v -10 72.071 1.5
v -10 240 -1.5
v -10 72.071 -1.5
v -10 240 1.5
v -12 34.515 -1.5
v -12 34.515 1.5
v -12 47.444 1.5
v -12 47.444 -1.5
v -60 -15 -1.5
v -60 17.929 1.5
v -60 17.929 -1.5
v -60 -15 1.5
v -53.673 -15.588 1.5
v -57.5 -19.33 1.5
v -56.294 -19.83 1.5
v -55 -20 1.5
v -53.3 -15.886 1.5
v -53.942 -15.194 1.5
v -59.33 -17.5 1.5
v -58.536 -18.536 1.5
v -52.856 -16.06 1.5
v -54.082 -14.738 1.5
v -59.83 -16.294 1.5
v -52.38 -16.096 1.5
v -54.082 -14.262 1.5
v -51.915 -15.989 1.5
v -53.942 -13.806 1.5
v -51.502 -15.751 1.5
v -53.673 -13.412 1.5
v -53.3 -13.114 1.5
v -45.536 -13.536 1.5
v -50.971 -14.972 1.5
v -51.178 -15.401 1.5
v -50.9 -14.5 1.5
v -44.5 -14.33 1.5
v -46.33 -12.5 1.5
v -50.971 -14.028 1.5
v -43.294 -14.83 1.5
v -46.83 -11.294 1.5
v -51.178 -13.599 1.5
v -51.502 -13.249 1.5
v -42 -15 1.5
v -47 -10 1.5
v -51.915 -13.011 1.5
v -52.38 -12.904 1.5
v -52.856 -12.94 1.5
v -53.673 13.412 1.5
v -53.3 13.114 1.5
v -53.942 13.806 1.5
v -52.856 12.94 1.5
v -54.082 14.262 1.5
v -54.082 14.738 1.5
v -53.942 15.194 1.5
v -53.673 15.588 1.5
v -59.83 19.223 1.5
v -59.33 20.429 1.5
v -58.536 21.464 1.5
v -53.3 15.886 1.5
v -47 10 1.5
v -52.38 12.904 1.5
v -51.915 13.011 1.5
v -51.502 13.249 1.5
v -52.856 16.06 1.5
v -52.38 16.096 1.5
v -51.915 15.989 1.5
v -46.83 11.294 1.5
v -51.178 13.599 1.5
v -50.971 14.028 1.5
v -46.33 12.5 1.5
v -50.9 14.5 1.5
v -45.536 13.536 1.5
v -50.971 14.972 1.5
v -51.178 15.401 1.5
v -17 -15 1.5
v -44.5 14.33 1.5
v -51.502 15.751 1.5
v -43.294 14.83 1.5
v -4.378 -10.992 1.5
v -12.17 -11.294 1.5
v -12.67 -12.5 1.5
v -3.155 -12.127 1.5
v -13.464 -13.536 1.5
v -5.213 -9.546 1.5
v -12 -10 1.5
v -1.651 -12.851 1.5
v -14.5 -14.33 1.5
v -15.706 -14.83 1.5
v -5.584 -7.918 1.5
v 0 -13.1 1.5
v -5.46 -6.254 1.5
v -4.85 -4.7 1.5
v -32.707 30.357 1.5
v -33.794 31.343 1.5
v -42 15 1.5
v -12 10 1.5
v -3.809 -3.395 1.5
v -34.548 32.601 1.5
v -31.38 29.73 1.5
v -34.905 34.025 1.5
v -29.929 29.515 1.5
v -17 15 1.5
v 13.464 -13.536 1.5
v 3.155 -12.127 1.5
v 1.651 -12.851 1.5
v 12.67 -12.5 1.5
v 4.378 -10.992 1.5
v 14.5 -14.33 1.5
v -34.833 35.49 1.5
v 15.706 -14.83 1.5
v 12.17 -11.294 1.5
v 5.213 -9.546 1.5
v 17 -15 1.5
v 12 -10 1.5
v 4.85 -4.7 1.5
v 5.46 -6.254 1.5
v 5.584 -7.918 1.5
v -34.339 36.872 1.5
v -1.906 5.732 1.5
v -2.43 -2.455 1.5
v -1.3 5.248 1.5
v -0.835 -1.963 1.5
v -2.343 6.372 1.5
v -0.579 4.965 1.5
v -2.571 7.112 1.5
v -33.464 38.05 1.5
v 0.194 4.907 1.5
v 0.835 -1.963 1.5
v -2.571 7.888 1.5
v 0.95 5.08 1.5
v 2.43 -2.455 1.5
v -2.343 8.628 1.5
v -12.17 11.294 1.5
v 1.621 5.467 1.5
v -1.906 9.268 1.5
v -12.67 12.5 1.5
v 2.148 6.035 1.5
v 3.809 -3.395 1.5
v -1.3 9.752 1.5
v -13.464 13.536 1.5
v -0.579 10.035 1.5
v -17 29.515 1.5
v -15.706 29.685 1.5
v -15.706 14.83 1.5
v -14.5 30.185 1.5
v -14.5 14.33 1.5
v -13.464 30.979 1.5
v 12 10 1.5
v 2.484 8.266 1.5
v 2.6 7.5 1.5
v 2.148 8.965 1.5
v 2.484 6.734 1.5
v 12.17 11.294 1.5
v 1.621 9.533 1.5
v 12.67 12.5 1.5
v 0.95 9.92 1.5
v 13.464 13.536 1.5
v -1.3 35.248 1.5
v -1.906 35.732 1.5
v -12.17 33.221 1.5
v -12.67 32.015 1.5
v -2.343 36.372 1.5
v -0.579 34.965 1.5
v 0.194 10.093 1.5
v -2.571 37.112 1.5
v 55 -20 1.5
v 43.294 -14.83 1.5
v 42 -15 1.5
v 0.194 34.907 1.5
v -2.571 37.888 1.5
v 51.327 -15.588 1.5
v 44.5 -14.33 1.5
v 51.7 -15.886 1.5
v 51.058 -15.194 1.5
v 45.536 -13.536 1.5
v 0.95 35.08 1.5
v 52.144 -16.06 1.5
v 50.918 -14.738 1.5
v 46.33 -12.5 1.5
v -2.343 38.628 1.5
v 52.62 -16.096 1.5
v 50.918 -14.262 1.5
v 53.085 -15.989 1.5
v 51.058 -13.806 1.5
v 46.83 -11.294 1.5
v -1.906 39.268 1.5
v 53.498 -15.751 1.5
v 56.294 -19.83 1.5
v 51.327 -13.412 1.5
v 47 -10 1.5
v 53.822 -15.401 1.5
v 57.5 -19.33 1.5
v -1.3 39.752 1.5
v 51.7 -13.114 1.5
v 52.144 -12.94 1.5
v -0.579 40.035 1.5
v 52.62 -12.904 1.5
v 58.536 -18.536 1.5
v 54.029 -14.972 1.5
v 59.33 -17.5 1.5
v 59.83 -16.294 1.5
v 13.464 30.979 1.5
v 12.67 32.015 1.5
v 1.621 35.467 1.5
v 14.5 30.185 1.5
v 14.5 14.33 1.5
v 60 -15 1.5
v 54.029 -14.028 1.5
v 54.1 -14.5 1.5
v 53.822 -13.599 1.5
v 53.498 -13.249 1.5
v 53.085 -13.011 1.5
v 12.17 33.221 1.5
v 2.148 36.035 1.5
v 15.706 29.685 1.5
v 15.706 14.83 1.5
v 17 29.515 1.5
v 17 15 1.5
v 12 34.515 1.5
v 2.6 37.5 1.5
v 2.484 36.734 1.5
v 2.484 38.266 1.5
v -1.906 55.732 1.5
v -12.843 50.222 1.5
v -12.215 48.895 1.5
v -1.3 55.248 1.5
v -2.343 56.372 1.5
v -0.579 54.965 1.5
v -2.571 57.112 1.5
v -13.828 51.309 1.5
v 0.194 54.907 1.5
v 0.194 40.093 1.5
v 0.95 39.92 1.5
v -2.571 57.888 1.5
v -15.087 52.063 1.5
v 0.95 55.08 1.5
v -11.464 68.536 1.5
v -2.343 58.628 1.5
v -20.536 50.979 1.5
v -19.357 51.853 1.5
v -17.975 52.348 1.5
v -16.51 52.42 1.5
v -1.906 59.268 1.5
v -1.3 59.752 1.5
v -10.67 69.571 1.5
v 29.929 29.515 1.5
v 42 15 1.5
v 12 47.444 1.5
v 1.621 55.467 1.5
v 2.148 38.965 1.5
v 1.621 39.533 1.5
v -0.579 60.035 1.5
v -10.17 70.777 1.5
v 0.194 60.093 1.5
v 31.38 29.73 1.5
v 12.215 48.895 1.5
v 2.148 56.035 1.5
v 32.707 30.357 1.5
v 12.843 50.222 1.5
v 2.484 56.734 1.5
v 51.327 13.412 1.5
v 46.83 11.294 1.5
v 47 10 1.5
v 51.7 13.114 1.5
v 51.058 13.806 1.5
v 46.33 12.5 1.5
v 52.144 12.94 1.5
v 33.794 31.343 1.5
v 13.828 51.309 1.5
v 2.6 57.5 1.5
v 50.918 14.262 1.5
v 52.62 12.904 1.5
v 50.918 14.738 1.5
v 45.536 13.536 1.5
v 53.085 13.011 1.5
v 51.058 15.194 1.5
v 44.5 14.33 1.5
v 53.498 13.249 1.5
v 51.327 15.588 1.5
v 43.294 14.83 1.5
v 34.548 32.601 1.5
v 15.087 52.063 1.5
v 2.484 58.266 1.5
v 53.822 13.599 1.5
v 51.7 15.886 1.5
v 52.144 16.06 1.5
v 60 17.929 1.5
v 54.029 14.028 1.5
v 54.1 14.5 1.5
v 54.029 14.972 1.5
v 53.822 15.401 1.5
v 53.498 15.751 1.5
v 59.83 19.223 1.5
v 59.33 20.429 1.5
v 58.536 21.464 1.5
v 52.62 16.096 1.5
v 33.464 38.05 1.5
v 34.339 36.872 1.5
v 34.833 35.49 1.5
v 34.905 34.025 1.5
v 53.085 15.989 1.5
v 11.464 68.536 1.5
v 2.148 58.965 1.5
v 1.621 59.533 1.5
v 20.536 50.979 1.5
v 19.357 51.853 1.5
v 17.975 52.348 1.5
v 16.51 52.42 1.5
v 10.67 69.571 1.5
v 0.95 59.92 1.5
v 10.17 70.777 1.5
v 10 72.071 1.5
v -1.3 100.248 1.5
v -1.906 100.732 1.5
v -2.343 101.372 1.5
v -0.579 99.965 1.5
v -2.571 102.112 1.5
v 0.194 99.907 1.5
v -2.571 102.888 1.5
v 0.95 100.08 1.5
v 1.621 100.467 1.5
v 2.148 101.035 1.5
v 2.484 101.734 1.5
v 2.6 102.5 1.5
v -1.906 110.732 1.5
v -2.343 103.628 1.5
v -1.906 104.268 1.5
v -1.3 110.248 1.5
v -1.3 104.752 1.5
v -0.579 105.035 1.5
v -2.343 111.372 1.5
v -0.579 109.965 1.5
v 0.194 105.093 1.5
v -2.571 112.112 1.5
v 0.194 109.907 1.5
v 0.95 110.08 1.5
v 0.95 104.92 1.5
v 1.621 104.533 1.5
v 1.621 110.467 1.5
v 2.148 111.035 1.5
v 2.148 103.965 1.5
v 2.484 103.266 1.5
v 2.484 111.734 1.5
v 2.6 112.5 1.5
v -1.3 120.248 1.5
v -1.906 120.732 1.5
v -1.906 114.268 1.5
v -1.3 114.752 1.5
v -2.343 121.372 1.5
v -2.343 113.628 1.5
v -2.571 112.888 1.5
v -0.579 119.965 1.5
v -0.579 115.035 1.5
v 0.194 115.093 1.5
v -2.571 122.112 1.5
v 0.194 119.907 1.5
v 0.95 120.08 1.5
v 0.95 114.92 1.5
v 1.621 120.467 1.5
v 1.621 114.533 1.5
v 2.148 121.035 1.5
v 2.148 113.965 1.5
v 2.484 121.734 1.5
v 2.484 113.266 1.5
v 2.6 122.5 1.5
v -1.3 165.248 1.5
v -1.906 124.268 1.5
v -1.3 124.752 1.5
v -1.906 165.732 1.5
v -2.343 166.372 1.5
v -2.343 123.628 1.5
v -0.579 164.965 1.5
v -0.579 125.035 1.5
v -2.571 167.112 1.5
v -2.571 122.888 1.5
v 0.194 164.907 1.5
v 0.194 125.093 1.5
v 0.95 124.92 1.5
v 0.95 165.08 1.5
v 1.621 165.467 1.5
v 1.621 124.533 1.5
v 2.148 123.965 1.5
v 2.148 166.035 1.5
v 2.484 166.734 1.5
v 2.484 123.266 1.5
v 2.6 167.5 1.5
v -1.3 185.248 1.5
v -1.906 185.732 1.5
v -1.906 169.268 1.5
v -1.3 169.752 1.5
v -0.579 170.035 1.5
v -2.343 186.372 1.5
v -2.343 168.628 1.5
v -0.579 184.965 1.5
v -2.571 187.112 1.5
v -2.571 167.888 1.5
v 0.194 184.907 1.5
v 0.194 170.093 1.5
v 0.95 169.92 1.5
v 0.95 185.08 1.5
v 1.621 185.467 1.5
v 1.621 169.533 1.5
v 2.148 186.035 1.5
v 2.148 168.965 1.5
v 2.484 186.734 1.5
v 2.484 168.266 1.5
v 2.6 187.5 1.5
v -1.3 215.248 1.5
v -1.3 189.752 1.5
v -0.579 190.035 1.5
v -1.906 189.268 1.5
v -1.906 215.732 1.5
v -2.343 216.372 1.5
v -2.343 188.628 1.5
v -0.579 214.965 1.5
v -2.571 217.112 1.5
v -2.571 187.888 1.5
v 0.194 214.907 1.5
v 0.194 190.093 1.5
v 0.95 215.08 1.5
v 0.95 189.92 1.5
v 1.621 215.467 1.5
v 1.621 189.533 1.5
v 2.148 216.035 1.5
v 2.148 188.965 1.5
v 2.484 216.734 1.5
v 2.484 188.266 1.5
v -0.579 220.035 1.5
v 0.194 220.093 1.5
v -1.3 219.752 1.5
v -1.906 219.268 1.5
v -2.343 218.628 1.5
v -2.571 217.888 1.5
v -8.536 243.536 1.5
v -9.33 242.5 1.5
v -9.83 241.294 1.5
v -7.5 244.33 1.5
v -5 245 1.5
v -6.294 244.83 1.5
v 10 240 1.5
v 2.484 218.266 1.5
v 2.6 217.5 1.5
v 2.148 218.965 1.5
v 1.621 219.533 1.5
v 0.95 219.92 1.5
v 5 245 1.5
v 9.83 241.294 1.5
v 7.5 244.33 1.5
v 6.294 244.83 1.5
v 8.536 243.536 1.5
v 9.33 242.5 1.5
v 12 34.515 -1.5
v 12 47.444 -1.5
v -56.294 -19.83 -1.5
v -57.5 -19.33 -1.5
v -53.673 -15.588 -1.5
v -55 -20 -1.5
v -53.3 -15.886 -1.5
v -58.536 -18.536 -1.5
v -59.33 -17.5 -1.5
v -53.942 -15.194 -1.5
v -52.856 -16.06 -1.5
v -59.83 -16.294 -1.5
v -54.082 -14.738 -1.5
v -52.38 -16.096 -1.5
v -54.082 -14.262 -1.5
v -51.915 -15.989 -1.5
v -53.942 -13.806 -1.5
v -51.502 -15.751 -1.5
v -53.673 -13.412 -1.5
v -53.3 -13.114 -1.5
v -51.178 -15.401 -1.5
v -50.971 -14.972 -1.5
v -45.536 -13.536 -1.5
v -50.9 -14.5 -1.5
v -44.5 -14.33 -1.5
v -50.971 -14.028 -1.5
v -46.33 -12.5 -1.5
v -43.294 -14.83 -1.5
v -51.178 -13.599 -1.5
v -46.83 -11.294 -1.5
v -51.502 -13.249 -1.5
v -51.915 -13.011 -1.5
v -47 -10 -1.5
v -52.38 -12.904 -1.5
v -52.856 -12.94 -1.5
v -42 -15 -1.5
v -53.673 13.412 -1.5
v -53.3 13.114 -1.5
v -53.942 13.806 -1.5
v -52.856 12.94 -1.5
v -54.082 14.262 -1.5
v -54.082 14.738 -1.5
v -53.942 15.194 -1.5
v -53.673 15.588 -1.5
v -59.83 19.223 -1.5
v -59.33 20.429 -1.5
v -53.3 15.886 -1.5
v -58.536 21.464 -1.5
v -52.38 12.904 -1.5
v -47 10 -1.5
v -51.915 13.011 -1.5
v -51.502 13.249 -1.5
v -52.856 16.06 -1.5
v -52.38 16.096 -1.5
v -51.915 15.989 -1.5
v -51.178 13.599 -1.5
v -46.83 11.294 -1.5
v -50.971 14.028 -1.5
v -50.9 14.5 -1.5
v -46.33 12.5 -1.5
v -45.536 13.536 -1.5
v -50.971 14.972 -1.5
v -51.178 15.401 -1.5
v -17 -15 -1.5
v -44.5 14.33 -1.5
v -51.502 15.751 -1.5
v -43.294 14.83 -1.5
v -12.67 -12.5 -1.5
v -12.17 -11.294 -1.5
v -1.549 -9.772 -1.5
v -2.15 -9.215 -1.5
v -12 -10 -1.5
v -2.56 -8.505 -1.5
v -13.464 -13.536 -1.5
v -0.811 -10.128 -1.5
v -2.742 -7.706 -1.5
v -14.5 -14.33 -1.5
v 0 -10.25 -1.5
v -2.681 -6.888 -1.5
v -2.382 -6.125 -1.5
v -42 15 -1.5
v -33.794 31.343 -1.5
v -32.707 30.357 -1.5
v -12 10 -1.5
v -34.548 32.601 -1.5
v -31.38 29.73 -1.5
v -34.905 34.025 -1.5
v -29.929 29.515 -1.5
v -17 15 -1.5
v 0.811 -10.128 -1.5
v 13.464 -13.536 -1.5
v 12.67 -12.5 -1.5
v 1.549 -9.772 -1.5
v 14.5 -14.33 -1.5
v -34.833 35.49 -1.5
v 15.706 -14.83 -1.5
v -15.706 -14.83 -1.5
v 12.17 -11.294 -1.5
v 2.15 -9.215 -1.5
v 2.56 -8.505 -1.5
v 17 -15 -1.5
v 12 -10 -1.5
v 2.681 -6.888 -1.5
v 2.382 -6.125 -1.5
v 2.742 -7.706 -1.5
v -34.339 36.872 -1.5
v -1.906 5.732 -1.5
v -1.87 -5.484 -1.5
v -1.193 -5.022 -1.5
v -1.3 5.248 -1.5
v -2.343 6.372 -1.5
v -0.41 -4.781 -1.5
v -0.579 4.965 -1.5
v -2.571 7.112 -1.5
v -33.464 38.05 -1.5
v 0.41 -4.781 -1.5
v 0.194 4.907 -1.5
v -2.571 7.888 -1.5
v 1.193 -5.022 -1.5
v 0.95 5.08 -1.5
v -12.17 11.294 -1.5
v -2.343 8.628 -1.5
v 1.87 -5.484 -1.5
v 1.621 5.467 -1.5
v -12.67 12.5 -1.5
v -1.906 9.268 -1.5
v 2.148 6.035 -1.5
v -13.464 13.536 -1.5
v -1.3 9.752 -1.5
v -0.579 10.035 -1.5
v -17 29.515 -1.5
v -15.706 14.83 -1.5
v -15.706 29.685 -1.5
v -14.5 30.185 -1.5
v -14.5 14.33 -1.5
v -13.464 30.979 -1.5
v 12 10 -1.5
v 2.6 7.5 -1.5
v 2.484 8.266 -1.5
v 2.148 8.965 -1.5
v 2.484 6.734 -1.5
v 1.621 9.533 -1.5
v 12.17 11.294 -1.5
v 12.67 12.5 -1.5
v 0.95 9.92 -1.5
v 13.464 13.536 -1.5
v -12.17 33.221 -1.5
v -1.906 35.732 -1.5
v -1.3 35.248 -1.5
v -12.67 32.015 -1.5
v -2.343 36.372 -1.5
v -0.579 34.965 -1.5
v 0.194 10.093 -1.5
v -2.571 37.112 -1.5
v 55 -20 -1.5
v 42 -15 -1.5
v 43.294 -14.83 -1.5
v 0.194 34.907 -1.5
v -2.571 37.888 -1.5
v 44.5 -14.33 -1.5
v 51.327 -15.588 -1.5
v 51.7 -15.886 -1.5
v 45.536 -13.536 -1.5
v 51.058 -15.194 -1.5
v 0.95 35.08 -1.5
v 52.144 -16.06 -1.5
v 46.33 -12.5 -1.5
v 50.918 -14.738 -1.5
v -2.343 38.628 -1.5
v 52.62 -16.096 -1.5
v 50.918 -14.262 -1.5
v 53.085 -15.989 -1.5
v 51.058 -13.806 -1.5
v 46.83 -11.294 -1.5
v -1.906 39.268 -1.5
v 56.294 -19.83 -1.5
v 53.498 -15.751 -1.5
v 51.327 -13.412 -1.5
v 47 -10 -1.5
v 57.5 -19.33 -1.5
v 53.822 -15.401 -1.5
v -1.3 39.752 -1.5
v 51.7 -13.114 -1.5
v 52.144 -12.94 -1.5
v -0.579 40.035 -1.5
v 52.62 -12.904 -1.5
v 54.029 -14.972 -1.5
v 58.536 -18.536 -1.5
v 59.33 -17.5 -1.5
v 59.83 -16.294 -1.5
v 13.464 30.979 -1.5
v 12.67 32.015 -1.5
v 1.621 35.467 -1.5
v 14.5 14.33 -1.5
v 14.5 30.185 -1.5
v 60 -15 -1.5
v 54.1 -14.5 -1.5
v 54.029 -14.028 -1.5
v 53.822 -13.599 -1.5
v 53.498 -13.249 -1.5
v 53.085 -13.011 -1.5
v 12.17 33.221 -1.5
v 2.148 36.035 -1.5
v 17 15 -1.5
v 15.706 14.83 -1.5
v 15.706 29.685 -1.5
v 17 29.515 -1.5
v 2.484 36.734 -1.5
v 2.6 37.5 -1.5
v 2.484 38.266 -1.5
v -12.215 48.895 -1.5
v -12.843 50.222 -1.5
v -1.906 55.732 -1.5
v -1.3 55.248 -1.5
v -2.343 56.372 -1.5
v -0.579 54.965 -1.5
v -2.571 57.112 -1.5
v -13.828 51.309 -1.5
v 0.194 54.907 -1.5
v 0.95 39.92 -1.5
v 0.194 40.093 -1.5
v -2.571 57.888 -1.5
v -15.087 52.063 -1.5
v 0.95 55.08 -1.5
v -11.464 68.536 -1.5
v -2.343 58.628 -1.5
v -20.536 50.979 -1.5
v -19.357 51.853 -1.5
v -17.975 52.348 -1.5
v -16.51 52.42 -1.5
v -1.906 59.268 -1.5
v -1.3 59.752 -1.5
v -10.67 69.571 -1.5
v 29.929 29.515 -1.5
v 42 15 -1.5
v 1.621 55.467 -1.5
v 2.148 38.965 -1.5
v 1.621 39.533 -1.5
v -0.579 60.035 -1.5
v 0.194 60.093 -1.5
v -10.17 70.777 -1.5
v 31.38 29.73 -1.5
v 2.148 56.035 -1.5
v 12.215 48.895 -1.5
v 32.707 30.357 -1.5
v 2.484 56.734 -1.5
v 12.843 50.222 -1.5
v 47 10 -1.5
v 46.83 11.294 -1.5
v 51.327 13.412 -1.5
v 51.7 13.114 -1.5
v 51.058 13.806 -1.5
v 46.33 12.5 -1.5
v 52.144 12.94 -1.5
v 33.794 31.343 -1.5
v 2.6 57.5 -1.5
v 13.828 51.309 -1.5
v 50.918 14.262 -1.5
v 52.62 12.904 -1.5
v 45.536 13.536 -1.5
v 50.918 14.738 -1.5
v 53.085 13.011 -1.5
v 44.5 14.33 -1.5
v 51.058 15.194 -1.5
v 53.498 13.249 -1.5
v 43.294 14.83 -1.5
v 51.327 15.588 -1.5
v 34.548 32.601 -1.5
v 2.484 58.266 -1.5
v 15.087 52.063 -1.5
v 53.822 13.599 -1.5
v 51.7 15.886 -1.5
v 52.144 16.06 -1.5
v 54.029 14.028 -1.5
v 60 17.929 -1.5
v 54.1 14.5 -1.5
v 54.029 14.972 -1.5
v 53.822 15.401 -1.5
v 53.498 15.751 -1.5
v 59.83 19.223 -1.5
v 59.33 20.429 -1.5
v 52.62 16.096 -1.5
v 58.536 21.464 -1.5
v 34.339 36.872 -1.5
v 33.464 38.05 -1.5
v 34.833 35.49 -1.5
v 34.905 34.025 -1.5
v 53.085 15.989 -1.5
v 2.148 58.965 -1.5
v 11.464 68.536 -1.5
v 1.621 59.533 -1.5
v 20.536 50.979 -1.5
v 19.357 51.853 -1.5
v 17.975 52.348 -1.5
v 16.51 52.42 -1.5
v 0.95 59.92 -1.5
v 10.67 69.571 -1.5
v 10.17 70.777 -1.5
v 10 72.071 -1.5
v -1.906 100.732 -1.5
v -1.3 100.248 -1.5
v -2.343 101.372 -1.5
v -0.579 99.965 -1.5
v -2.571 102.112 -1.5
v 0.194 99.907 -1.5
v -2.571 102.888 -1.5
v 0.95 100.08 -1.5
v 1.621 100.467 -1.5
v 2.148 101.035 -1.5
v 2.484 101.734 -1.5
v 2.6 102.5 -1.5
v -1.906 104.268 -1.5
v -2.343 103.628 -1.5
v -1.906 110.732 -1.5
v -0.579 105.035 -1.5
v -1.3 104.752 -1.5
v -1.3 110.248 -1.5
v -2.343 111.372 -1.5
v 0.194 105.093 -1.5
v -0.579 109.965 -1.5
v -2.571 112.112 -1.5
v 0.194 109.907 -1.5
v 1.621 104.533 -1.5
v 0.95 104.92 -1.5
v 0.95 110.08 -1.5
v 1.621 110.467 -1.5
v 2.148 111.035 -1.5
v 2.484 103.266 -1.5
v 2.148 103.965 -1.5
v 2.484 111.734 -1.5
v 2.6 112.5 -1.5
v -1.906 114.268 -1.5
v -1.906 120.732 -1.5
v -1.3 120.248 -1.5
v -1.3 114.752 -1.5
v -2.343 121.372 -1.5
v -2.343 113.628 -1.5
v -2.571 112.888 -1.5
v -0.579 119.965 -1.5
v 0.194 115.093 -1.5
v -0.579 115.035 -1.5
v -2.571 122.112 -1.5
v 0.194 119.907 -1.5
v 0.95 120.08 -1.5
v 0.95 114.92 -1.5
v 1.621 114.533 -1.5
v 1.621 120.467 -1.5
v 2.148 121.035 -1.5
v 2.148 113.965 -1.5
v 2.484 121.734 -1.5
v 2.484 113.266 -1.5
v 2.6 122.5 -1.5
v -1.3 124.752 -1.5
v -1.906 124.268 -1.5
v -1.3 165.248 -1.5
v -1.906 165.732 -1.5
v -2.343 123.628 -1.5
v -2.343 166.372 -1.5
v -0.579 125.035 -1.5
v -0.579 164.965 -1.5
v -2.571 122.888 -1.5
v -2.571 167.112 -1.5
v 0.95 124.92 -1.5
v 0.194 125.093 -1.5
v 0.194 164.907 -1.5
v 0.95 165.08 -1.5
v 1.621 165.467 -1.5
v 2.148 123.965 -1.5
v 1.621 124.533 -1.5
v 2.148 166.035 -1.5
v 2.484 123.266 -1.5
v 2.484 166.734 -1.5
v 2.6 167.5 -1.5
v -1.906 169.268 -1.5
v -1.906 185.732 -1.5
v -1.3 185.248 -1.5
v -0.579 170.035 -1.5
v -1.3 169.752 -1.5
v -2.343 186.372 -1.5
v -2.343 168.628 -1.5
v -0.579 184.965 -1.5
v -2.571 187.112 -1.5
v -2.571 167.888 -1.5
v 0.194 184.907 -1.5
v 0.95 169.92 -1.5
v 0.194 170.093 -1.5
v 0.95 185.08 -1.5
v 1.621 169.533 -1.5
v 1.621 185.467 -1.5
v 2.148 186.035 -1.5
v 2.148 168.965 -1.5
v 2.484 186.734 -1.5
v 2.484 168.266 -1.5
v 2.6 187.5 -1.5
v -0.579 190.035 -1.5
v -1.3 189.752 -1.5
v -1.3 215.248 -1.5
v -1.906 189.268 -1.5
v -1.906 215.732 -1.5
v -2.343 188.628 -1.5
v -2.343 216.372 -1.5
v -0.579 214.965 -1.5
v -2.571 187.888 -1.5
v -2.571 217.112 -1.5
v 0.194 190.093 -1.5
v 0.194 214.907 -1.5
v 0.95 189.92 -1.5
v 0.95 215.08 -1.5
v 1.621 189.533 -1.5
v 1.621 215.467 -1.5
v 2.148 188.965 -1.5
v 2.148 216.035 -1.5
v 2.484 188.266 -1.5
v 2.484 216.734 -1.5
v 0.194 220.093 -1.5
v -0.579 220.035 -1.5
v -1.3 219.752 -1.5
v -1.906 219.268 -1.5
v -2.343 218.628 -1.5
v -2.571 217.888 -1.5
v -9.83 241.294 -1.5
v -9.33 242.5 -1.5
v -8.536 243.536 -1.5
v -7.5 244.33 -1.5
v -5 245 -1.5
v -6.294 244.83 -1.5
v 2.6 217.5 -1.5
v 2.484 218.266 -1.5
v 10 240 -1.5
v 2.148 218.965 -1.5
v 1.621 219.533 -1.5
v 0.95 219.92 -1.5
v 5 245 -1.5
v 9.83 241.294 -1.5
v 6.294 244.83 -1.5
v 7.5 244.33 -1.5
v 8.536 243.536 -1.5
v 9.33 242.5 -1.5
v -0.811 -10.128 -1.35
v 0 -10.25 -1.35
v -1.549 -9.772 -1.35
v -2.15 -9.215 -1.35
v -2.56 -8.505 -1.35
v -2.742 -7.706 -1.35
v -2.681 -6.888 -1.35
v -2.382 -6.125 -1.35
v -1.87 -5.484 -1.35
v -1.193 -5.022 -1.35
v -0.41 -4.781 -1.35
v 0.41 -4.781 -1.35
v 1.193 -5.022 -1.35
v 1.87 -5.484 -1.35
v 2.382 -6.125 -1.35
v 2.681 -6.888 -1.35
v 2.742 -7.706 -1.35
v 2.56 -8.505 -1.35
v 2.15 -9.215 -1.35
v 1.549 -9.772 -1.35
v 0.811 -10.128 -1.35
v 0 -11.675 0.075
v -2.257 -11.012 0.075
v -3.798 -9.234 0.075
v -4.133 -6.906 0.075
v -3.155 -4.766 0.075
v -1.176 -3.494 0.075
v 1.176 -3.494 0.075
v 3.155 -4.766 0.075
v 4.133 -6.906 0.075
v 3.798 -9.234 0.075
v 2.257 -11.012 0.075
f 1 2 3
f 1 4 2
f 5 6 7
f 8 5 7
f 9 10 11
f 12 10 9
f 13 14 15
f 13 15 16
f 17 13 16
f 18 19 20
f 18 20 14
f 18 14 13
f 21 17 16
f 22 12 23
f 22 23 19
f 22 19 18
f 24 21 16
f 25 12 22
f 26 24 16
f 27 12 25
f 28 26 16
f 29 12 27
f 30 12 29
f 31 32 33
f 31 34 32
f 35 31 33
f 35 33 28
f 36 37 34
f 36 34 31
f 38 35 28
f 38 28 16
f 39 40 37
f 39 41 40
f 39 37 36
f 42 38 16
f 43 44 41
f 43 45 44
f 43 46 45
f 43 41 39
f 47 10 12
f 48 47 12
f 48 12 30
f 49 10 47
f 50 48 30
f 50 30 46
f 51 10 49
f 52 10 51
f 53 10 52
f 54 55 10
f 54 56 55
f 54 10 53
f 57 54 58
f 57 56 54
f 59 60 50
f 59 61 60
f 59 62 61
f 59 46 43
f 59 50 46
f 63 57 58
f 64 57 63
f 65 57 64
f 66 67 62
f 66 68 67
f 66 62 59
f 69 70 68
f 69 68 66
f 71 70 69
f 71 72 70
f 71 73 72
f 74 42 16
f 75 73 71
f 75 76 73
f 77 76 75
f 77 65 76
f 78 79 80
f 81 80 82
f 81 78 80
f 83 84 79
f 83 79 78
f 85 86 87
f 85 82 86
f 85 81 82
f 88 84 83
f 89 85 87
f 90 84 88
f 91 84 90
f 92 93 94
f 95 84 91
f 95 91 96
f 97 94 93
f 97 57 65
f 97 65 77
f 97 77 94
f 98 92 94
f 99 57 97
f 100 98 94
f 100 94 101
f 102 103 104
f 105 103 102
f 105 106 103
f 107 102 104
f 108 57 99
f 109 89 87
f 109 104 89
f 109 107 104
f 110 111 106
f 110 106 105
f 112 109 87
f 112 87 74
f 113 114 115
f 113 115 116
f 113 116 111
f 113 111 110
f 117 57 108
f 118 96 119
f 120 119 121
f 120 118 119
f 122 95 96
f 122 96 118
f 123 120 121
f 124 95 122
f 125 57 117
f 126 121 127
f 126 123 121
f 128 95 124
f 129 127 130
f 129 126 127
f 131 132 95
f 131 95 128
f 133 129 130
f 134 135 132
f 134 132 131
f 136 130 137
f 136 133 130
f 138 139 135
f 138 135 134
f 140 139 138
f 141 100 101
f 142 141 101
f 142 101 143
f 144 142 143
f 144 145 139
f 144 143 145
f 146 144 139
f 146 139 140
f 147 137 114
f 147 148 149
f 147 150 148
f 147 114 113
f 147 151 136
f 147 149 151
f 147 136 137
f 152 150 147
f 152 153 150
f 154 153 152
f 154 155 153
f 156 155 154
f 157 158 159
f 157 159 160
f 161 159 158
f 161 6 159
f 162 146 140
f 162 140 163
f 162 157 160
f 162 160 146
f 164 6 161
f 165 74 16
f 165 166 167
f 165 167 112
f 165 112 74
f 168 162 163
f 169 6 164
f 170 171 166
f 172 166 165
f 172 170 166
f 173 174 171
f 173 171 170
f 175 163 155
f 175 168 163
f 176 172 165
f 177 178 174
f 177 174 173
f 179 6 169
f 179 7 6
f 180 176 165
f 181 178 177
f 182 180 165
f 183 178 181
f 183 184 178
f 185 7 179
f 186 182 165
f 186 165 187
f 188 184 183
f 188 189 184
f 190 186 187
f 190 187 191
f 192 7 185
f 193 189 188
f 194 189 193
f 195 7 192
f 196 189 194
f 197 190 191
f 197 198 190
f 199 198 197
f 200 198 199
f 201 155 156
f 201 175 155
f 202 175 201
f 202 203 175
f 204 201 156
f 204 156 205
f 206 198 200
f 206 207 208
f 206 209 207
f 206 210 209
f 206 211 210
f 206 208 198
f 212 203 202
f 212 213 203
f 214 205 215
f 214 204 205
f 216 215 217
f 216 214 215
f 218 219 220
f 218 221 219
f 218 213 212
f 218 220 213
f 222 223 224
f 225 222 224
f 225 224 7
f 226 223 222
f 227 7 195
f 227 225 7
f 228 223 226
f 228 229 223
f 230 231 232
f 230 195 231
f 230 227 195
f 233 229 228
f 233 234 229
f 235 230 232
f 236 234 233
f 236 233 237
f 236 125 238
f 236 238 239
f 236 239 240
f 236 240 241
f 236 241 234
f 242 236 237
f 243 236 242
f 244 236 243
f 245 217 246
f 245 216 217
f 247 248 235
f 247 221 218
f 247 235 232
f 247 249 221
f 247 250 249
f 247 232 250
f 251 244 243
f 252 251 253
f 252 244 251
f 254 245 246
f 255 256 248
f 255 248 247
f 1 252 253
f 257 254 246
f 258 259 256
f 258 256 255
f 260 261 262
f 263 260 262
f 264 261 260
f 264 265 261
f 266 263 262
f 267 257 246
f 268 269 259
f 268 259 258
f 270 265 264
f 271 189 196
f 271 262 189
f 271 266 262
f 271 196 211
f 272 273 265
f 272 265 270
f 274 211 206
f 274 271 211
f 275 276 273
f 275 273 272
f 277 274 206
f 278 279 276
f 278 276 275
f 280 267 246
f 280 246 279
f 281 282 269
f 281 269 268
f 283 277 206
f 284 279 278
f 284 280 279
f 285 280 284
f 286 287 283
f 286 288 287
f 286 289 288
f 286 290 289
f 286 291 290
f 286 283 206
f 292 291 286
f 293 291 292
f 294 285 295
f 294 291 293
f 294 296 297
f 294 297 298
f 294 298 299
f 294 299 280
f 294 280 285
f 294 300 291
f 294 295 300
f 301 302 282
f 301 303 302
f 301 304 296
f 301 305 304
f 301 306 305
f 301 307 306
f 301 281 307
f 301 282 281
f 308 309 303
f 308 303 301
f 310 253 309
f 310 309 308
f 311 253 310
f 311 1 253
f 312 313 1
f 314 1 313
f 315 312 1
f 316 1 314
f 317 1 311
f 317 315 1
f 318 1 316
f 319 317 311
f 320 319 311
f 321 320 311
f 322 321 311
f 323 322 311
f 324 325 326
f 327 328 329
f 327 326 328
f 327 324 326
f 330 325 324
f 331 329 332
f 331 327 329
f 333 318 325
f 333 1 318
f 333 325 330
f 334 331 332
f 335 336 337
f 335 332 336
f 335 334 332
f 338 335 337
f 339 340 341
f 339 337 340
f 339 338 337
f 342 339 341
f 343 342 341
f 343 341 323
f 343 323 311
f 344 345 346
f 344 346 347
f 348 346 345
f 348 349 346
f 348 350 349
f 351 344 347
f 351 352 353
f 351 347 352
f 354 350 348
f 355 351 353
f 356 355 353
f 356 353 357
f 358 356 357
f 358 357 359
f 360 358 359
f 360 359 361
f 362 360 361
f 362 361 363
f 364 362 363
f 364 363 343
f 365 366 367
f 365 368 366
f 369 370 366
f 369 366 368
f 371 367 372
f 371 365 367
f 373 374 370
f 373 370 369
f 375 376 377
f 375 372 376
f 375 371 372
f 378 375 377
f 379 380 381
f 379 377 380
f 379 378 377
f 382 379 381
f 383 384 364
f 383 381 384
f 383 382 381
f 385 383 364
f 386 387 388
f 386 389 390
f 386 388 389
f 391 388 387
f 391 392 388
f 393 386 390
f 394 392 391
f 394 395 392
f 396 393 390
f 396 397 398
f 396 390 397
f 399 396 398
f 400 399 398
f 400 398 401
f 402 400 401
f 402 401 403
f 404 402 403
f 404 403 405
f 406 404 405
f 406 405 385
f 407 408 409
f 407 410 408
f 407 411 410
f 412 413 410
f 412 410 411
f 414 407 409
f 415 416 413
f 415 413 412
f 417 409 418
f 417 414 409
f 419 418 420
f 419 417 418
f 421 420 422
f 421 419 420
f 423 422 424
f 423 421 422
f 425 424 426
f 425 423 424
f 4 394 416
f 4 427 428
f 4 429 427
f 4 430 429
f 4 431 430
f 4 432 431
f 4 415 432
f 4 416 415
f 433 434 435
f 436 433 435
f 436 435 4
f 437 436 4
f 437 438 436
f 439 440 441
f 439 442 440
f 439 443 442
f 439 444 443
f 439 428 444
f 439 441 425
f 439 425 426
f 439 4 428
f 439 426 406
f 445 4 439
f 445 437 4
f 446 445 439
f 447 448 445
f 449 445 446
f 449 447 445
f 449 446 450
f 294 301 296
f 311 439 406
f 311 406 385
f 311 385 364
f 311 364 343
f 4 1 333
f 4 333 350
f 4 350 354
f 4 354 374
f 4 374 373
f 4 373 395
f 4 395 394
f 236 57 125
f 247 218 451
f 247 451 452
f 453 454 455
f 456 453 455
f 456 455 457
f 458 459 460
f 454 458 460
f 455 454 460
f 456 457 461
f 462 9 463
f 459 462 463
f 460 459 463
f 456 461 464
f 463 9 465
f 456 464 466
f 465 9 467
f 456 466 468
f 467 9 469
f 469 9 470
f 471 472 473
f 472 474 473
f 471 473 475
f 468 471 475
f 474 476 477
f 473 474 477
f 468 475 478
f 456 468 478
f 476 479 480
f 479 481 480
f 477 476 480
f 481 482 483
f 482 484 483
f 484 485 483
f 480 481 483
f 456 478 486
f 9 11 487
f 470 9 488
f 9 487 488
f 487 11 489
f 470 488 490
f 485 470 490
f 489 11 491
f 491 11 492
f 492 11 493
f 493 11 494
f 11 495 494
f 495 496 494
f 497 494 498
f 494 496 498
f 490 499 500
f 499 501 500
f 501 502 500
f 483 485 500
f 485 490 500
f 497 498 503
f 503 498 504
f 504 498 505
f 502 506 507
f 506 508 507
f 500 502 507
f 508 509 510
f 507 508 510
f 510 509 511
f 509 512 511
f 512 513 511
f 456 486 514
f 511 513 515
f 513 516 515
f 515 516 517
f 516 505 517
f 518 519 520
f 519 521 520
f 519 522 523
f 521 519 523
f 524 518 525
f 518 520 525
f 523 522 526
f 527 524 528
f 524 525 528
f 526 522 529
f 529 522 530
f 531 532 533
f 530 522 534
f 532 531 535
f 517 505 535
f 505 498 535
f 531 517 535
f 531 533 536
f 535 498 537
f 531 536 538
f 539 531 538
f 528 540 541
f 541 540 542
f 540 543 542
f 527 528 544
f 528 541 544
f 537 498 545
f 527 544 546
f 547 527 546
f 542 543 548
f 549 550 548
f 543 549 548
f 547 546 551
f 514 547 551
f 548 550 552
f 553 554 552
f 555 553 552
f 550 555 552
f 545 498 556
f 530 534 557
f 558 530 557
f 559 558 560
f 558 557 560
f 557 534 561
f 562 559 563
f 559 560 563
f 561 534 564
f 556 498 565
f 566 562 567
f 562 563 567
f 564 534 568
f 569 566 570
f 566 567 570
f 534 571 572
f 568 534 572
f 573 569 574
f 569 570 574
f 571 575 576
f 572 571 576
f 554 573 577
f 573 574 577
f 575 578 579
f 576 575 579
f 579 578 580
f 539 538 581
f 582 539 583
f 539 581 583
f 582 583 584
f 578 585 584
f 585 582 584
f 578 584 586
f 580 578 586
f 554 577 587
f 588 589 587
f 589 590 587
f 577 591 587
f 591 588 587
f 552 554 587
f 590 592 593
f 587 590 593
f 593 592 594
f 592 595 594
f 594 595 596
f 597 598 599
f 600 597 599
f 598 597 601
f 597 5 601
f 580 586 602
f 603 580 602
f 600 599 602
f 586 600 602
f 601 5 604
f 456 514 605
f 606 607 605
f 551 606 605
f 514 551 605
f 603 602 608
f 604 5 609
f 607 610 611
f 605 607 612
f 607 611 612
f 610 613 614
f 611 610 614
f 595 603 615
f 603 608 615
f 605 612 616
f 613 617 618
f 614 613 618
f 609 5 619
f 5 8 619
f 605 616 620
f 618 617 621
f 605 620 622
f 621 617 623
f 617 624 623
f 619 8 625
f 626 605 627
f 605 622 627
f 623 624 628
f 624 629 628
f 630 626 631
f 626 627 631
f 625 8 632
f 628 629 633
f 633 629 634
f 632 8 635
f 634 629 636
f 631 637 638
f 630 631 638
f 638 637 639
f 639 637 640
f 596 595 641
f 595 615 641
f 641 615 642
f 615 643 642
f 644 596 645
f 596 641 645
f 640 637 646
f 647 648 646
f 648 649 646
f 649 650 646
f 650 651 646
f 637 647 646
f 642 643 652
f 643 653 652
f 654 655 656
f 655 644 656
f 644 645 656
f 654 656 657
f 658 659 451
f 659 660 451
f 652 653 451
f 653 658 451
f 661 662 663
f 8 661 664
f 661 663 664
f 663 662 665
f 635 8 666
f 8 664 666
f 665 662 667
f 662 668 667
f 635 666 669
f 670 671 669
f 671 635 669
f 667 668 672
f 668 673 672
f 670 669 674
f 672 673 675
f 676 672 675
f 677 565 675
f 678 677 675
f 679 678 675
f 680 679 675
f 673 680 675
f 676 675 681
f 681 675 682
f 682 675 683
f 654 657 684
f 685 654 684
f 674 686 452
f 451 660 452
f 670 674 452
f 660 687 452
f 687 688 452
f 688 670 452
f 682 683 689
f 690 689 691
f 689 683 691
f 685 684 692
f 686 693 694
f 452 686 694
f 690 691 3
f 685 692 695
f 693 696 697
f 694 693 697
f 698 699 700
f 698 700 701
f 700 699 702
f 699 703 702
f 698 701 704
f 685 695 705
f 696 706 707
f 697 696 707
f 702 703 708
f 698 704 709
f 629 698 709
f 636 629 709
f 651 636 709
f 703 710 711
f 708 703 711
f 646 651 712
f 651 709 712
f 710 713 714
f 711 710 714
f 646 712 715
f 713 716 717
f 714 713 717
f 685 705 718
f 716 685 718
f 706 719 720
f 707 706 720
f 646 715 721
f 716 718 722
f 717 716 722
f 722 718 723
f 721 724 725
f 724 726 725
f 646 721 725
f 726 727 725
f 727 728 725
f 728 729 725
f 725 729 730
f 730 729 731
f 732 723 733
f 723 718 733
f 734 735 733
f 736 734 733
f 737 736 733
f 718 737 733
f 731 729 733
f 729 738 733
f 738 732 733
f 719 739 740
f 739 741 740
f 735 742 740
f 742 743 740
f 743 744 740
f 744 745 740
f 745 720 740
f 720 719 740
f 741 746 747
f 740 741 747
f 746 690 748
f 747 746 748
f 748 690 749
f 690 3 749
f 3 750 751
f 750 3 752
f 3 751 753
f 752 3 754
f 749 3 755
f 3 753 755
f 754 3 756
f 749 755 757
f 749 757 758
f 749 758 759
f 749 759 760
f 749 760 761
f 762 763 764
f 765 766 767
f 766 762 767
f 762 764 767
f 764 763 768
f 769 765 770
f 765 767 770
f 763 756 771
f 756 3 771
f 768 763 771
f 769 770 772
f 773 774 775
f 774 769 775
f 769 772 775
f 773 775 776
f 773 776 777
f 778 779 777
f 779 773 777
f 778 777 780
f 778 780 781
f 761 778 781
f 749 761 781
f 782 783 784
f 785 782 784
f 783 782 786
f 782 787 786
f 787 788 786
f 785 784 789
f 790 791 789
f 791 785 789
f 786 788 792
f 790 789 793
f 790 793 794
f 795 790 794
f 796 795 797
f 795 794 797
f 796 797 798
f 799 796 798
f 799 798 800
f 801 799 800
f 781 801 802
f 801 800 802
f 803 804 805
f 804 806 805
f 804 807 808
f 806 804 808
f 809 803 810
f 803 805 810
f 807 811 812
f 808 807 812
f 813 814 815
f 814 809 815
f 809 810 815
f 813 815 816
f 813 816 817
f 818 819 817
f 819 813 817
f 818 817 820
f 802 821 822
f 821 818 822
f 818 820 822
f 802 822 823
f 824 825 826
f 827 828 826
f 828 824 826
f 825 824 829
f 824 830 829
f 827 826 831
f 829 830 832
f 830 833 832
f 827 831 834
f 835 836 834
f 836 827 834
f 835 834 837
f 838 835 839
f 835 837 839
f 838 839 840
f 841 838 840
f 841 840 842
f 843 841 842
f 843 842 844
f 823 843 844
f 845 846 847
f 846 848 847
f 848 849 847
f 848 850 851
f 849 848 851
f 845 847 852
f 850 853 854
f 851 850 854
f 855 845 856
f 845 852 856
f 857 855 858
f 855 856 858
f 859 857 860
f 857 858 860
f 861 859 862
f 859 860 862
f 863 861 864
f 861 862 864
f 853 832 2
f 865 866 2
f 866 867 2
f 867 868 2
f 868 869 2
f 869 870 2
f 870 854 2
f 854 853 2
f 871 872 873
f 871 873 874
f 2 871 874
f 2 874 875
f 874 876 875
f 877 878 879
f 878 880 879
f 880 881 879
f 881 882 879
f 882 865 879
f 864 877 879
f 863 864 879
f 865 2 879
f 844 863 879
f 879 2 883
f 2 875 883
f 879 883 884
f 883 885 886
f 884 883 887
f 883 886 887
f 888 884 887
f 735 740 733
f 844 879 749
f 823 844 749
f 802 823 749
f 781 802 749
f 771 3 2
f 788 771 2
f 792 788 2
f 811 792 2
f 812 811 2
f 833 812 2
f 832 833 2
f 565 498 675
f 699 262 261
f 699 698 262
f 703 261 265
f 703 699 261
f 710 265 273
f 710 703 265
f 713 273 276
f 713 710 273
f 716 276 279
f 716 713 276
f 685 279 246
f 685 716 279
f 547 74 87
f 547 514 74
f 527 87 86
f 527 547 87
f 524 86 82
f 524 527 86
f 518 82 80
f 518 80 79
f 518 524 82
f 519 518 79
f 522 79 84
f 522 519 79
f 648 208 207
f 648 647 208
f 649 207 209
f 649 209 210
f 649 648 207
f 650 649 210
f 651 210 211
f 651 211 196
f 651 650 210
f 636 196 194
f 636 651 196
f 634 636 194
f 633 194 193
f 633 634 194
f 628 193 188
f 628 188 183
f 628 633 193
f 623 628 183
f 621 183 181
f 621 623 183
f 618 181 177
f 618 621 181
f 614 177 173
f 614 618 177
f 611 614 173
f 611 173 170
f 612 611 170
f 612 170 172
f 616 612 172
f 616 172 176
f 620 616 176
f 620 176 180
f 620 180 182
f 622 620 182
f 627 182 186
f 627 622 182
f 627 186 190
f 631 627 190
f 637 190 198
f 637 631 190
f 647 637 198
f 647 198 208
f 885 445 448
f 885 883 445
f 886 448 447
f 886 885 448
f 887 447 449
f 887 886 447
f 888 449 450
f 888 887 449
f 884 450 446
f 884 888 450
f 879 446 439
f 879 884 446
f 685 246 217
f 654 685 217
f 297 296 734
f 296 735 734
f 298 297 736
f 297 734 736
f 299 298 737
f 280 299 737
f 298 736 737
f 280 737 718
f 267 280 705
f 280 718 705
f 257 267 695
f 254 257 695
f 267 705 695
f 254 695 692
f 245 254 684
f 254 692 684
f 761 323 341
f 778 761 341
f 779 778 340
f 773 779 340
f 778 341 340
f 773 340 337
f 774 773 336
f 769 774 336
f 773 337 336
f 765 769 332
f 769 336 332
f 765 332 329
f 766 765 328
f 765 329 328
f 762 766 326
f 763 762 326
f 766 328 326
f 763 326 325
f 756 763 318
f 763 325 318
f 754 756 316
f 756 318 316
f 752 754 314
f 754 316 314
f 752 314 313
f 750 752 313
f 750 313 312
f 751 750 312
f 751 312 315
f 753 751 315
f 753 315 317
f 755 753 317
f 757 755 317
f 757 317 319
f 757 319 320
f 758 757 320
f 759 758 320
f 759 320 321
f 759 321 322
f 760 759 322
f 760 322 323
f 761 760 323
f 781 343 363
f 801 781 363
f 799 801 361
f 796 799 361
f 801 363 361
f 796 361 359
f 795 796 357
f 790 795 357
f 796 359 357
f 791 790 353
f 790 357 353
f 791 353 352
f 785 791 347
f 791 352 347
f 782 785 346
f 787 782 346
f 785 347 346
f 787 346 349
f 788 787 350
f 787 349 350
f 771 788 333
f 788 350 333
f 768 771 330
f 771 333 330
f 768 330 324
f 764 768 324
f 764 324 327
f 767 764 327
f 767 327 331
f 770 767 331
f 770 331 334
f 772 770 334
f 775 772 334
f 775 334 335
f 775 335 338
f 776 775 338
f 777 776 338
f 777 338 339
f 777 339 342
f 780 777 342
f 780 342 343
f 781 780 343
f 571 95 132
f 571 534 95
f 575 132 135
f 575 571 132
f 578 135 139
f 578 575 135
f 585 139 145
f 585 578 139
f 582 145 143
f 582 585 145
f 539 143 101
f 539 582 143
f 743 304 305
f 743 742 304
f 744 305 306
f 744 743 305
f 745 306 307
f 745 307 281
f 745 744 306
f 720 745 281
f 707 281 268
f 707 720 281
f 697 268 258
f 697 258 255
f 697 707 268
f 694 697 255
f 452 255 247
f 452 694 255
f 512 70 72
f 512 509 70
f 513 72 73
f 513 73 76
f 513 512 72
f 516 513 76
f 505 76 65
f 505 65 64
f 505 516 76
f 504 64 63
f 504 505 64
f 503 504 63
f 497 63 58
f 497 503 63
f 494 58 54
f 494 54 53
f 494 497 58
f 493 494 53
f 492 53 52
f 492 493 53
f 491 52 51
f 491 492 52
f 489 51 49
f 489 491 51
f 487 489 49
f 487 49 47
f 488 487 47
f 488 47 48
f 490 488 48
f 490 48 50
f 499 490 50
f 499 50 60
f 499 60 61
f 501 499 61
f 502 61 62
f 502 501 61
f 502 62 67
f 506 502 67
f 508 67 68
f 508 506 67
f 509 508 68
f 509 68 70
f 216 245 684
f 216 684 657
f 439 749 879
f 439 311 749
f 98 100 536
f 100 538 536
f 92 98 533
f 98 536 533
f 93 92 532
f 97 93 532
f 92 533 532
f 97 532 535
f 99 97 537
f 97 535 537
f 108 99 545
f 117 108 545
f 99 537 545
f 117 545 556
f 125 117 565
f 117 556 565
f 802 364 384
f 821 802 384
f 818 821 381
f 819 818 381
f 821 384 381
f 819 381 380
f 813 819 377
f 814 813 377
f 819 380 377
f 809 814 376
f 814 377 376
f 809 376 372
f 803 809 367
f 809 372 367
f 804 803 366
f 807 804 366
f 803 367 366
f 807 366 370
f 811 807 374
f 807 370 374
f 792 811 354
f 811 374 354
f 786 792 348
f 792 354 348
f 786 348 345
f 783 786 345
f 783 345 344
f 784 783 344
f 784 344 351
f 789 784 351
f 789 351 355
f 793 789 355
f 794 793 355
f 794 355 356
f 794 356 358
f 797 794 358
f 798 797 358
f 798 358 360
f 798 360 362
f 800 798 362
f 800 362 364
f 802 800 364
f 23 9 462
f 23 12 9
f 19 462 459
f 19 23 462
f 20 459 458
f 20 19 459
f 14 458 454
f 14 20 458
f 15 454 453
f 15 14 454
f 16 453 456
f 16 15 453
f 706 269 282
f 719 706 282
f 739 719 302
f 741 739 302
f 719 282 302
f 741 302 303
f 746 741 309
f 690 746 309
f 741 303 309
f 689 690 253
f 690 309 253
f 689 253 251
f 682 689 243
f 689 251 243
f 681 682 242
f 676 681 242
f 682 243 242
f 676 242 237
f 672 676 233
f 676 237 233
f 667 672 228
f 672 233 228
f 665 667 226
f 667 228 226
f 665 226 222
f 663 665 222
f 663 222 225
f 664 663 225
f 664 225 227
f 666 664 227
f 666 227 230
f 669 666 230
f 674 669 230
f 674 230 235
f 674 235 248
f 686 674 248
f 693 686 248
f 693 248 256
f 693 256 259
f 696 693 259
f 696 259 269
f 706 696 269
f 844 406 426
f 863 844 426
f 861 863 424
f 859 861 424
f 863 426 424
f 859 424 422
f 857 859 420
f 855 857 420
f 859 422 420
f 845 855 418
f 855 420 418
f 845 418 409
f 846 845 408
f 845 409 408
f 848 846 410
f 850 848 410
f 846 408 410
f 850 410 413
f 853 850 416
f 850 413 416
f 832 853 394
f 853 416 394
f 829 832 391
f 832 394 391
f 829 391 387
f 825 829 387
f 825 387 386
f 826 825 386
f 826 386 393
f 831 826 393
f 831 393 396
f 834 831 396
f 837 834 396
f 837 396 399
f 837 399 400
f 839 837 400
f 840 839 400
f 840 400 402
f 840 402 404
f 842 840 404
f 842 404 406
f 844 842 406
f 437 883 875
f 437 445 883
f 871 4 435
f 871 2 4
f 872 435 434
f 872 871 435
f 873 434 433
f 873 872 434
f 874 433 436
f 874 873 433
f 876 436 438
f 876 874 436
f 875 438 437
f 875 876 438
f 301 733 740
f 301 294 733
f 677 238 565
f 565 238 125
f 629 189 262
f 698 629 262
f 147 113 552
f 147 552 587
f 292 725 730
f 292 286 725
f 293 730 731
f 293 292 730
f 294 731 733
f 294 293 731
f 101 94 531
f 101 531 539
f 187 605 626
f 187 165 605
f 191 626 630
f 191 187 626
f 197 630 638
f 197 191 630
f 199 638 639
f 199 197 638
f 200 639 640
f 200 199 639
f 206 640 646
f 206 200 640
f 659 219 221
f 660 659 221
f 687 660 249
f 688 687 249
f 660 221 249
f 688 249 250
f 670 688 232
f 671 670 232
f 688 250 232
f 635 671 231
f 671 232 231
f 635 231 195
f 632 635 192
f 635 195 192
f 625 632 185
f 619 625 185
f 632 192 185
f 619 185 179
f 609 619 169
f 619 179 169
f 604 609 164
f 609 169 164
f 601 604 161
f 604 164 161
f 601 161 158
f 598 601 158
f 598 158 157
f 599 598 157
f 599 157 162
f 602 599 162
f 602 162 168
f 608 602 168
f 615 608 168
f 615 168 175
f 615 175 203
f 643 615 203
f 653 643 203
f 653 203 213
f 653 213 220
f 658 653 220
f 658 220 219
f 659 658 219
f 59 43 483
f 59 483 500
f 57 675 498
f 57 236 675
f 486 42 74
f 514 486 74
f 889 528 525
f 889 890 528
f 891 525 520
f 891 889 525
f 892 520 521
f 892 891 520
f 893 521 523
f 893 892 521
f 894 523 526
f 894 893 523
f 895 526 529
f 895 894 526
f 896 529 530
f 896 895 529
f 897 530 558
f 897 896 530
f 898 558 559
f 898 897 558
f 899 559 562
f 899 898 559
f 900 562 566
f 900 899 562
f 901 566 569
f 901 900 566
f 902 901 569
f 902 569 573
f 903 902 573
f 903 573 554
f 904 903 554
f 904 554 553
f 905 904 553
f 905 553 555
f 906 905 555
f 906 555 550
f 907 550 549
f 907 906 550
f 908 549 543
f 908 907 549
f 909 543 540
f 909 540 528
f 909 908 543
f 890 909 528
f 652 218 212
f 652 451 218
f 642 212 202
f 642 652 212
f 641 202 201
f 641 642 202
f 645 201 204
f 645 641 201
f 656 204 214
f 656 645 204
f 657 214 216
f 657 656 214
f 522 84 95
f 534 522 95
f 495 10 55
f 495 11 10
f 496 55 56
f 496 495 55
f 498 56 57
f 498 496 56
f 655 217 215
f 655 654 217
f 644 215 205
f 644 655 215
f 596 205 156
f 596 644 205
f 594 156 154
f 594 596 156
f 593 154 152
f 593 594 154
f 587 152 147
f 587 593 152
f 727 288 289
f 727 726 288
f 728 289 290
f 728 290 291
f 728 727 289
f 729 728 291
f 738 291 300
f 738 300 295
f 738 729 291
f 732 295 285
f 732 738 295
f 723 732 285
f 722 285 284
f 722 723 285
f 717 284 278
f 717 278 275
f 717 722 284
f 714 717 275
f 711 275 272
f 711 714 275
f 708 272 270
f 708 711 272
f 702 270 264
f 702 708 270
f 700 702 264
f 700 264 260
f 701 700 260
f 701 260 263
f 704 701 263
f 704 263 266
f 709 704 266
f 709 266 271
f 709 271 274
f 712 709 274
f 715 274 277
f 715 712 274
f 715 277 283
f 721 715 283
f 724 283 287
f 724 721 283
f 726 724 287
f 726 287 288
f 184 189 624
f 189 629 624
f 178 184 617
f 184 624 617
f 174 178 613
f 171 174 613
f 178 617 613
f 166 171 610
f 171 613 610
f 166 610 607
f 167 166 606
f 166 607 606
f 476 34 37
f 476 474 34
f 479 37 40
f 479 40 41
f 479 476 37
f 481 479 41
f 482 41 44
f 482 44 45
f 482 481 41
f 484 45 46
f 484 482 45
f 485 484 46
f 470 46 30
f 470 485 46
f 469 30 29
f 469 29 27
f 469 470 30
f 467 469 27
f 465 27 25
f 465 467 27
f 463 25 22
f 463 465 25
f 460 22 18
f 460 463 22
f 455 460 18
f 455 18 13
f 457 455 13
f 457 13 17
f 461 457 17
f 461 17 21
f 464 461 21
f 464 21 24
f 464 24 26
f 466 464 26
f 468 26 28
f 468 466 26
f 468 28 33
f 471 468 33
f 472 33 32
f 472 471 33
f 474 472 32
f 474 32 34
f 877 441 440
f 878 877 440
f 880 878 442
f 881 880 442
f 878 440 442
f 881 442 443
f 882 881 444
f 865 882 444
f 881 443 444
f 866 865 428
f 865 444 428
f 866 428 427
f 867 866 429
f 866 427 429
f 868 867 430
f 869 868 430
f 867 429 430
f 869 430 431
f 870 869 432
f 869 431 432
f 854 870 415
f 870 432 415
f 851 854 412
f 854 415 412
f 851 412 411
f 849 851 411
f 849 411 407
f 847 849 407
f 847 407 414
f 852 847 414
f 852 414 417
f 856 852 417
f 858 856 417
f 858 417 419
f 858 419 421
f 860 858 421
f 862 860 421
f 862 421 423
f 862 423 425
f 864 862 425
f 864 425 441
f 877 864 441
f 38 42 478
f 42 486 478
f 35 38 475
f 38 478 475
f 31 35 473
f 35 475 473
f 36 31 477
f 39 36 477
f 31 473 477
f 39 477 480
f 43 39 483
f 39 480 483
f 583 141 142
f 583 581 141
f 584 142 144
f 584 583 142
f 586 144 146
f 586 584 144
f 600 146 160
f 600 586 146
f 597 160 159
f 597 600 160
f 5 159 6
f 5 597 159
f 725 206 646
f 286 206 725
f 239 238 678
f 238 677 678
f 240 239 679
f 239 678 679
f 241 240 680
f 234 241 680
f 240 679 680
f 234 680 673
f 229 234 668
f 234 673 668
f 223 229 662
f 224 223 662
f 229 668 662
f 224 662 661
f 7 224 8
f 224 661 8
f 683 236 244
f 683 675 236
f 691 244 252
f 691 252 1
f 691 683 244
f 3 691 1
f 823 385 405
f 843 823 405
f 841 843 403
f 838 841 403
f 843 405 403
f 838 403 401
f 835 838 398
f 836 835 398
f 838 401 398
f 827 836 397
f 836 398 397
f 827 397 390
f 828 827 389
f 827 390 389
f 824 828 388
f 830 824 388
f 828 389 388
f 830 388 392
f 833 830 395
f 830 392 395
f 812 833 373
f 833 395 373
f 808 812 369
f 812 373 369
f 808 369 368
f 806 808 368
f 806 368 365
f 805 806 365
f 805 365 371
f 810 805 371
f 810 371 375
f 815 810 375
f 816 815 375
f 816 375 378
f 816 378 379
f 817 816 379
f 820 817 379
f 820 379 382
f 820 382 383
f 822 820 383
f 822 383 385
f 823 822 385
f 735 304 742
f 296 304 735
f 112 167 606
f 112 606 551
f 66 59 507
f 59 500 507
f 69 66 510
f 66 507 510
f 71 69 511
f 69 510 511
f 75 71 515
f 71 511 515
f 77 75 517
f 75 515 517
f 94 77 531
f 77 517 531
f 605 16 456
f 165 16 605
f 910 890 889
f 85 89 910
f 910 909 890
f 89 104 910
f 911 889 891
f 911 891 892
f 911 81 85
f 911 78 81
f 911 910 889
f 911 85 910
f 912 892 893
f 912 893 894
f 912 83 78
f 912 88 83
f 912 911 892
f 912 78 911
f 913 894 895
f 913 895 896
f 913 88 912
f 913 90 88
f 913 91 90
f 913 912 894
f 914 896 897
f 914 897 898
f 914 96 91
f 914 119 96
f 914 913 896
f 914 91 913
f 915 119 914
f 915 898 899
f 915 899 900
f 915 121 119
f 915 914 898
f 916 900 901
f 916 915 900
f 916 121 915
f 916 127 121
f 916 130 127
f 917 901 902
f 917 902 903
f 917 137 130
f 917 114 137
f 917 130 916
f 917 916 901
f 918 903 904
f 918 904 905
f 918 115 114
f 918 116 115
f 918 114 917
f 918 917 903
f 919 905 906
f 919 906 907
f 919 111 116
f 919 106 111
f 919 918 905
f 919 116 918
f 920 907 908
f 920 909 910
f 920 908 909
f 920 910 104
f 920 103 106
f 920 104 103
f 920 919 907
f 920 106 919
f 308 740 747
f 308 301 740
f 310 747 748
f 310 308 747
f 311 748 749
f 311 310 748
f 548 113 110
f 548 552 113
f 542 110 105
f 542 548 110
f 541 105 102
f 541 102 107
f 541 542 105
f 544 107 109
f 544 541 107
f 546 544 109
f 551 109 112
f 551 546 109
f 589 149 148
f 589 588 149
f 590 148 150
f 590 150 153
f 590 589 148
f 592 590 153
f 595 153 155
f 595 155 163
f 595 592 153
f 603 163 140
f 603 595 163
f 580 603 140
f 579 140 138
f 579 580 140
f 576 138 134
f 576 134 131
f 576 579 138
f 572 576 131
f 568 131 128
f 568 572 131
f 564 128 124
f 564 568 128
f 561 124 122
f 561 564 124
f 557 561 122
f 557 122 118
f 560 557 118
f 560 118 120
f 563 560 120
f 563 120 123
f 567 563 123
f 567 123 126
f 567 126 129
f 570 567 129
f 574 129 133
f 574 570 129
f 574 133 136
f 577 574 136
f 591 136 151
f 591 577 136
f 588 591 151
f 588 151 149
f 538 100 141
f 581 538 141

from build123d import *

# Parameters (mm, degrees)
SKETCH_1_R          = 1.6
SKETCH_1_R_2        = 2.6
EXTRUDE_1_DEPTH     = 1.5
SKETCH_2_R          = 2.6
CUT_EXTRUDE_1_DEPTH = 253.257804636
SKETCH_3_W          = 35
SKETCH_3_H          = 30
CUT_EXTRUDE_2_DEPTH = 253.257804636
FILLET_1_R          = 5


with BuildPart() as part:
    # 草图1 → 凸台-拉伸1 (new, symmetric)
    with BuildSketch(Plane.XY):
        Polygon((-60, 20), (-60, -20), (60, -20), (60, 20), (10, 70), (10, 245), (-10, 245), (-10, 70), align=None)
        with Locations((-52.5, -14.5)):
            Circle(SKETCH_1_R, mode=Mode.SUBTRACT)
        with Locations((52.5, -14.5)):
            Circle(SKETCH_1_R, mode=Mode.SUBTRACT)
        with Locations((52.5, 14.5)):
            Circle(SKETCH_1_R, mode=Mode.SUBTRACT)
        with Locations((-52.5, 14.5)):
            Circle(SKETCH_1_R, mode=Mode.SUBTRACT)
        with Locations((0, 7.5)):
            Circle(SKETCH_1_R_2, mode=Mode.SUBTRACT)
        with Locations((0, -7.5)):
            Circle(SKETCH_1_R_2, mode=Mode.SUBTRACT)
    extrude(amount=EXTRUDE_1_DEPTH, both=True)

    # 草图2 → 切除-拉伸1 (cut, through all)
    with BuildSketch(Plane.XY.offset(1.5)):
        with Locations((0, 217.5)):
            Circle(SKETCH_2_R)
        with Locations((0, 187.5)):
            Circle(SKETCH_2_R)
        with Locations((0, 167.5)):
            Circle(SKETCH_2_R)
        with Locations((0, 122.5)):
            Circle(SKETCH_2_R)
        with Locations((0, 112.5)):
            Circle(SKETCH_2_R)
        with Locations((0, 102.5)):
            Circle(SKETCH_2_R)
        with Locations((0, 57.5)):
            Circle(SKETCH_2_R)
        with Locations((0, 37.5)):
            Circle(SKETCH_2_R)
    extrude(amount=-CUT_EXTRUDE_1_DEPTH, mode=Mode.SUBTRACT)

    # 草图3 → 切除-拉伸2 (cut, through all)
    with BuildSketch(Plane.XY.offset(1.5)):
        Polygon((-42, 29.514718626), (-12, 29.514718626), (-12, 59.514718626), align=None)
        with Locations((-29.5, 0)):
            Rectangle(SKETCH_3_W, SKETCH_3_H)
    cut_extrude_2 = extrude(amount=-CUT_EXTRUDE_2_DEPTH, mode=Mode.SUBTRACT)

    # 镜向1: 切除-拉伸2 across plane
    add(cut_extrude_2.mirror(Plane(origin=(0, 0, 0), x_dir=(0, 0, 1), z_dir=(1, 0, 0))), mode=Mode.SUBTRACT)

    # 圆角1
    fillet_1_edges = [part.edges().sort_by_distance(p)[0] for p in [
        (12, 59.514718626, 0),
        (42, 29.514718626, 0),
        (12, 29.514718626, 0),
        (12, 15, 0),
        (47, 15, 0),
        (47, -15, 0),
        (12, -15, 0),
        (60, -20, 0),
        (-60, -20, 0),
        (-60, 20, 0),
        (-10, 70, 0),
        (-10, 245, 0),
        (10, 245, 0),
        (10, 70, 0),
        (60, 20, 0),
        (-42, 29.514718626, 0),
        (-12, 59.514718626, 0),
        (-12, 29.514718626, 0),
        (-47, 15, 0),
        (-12, 15, 0),
        (-12, -15, 0),
        (-47, -15, 0),
    ]]
    fillet(fillet_1_edges, radius=FILLET_1_R)

    # 草图5 → M5 六角凹锥坑螺钉的锥形沉头孔1 (revolve, cut)
    with BuildSketch(Plane(origin=(0, -7.5, 1.5), x_dir=(0, -1, 0), z_dir=(1, 0, 0))):
        Polygon((0, 0), (0, 3), (2.75, 3), (2.75, 2.85), (5.6, 0), align=None)
    revolve(axis=Axis((0, -7.5, 7.85), (0, 0, -1)), mode=Mode.SUBTRACT)


solid = part.part
